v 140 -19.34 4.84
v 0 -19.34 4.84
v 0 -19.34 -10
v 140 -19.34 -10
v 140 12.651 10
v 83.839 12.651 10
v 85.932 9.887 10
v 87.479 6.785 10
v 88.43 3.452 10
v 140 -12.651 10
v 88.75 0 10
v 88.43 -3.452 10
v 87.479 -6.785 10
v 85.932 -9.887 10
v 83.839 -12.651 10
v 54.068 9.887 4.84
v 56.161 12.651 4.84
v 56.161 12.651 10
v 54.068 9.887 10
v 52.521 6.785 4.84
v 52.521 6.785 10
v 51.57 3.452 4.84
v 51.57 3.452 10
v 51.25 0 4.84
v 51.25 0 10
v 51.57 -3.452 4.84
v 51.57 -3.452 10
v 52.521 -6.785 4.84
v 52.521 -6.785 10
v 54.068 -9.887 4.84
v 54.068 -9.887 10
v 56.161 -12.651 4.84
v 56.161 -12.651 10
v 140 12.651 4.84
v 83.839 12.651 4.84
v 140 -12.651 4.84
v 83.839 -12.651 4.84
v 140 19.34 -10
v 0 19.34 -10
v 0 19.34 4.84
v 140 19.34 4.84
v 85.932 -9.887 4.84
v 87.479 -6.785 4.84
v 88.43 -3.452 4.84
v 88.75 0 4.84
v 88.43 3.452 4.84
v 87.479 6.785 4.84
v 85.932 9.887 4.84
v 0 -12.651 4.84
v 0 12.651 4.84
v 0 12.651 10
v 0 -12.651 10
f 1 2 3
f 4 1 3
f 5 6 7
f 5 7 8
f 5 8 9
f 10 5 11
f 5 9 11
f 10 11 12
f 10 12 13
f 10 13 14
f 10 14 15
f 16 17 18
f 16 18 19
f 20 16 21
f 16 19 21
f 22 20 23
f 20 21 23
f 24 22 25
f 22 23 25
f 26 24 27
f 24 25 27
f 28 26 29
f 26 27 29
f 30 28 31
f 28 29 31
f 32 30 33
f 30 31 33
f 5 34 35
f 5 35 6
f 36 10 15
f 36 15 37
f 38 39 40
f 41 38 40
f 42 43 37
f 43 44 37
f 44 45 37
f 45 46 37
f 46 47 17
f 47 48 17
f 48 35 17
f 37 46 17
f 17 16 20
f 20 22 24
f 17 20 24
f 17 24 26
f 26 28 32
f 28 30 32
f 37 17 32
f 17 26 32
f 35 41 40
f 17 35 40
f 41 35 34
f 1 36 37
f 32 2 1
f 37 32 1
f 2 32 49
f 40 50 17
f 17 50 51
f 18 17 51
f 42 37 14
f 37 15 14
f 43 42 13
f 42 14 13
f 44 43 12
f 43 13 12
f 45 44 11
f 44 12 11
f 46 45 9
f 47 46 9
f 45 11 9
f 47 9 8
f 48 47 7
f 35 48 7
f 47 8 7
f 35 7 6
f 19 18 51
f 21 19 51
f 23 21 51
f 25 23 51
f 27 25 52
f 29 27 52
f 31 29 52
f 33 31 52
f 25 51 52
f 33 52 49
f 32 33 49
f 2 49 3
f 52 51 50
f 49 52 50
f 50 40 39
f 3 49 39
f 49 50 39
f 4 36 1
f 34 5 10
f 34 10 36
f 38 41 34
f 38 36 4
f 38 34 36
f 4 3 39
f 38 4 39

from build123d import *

# Parameters (mm, degrees)
BOSS_EXTRUDE1_DEPTH = 140
SKETCH2_R           = 18.75
CUT_EXTRUDE1_DEPTH  = 5.16


with BuildPart() as part:
    # Sketch1 → Boss-Extrude1 (new body)
    with BuildSketch(Plane(origin=(0, 0, 0), x_dir=(0, 0, -1), z_dir=(1, 0, 0))):
        Polygon((-4.84, 12.650615569), (-10, 12.650615569), (-10, -12.650615569), (-4.84, -12.650615569), (-4.84, -19.34), (10, -19.34), (10, 19.34), (-4.84, 19.34), align=None)
    extrude(amount=BOSS_EXTRUDE1_DEPTH)

    # Sketch2 → Cut-Extrude1 (cut)
    with BuildSketch(Plane.XY.offset(10)):
        with Locations((70, 0)):
            Circle(SKETCH2_R)
    extrude(amount=-CUT_EXTRUDE1_DEPTH, mode=Mode.SUBTRACT)


solid = part.part
